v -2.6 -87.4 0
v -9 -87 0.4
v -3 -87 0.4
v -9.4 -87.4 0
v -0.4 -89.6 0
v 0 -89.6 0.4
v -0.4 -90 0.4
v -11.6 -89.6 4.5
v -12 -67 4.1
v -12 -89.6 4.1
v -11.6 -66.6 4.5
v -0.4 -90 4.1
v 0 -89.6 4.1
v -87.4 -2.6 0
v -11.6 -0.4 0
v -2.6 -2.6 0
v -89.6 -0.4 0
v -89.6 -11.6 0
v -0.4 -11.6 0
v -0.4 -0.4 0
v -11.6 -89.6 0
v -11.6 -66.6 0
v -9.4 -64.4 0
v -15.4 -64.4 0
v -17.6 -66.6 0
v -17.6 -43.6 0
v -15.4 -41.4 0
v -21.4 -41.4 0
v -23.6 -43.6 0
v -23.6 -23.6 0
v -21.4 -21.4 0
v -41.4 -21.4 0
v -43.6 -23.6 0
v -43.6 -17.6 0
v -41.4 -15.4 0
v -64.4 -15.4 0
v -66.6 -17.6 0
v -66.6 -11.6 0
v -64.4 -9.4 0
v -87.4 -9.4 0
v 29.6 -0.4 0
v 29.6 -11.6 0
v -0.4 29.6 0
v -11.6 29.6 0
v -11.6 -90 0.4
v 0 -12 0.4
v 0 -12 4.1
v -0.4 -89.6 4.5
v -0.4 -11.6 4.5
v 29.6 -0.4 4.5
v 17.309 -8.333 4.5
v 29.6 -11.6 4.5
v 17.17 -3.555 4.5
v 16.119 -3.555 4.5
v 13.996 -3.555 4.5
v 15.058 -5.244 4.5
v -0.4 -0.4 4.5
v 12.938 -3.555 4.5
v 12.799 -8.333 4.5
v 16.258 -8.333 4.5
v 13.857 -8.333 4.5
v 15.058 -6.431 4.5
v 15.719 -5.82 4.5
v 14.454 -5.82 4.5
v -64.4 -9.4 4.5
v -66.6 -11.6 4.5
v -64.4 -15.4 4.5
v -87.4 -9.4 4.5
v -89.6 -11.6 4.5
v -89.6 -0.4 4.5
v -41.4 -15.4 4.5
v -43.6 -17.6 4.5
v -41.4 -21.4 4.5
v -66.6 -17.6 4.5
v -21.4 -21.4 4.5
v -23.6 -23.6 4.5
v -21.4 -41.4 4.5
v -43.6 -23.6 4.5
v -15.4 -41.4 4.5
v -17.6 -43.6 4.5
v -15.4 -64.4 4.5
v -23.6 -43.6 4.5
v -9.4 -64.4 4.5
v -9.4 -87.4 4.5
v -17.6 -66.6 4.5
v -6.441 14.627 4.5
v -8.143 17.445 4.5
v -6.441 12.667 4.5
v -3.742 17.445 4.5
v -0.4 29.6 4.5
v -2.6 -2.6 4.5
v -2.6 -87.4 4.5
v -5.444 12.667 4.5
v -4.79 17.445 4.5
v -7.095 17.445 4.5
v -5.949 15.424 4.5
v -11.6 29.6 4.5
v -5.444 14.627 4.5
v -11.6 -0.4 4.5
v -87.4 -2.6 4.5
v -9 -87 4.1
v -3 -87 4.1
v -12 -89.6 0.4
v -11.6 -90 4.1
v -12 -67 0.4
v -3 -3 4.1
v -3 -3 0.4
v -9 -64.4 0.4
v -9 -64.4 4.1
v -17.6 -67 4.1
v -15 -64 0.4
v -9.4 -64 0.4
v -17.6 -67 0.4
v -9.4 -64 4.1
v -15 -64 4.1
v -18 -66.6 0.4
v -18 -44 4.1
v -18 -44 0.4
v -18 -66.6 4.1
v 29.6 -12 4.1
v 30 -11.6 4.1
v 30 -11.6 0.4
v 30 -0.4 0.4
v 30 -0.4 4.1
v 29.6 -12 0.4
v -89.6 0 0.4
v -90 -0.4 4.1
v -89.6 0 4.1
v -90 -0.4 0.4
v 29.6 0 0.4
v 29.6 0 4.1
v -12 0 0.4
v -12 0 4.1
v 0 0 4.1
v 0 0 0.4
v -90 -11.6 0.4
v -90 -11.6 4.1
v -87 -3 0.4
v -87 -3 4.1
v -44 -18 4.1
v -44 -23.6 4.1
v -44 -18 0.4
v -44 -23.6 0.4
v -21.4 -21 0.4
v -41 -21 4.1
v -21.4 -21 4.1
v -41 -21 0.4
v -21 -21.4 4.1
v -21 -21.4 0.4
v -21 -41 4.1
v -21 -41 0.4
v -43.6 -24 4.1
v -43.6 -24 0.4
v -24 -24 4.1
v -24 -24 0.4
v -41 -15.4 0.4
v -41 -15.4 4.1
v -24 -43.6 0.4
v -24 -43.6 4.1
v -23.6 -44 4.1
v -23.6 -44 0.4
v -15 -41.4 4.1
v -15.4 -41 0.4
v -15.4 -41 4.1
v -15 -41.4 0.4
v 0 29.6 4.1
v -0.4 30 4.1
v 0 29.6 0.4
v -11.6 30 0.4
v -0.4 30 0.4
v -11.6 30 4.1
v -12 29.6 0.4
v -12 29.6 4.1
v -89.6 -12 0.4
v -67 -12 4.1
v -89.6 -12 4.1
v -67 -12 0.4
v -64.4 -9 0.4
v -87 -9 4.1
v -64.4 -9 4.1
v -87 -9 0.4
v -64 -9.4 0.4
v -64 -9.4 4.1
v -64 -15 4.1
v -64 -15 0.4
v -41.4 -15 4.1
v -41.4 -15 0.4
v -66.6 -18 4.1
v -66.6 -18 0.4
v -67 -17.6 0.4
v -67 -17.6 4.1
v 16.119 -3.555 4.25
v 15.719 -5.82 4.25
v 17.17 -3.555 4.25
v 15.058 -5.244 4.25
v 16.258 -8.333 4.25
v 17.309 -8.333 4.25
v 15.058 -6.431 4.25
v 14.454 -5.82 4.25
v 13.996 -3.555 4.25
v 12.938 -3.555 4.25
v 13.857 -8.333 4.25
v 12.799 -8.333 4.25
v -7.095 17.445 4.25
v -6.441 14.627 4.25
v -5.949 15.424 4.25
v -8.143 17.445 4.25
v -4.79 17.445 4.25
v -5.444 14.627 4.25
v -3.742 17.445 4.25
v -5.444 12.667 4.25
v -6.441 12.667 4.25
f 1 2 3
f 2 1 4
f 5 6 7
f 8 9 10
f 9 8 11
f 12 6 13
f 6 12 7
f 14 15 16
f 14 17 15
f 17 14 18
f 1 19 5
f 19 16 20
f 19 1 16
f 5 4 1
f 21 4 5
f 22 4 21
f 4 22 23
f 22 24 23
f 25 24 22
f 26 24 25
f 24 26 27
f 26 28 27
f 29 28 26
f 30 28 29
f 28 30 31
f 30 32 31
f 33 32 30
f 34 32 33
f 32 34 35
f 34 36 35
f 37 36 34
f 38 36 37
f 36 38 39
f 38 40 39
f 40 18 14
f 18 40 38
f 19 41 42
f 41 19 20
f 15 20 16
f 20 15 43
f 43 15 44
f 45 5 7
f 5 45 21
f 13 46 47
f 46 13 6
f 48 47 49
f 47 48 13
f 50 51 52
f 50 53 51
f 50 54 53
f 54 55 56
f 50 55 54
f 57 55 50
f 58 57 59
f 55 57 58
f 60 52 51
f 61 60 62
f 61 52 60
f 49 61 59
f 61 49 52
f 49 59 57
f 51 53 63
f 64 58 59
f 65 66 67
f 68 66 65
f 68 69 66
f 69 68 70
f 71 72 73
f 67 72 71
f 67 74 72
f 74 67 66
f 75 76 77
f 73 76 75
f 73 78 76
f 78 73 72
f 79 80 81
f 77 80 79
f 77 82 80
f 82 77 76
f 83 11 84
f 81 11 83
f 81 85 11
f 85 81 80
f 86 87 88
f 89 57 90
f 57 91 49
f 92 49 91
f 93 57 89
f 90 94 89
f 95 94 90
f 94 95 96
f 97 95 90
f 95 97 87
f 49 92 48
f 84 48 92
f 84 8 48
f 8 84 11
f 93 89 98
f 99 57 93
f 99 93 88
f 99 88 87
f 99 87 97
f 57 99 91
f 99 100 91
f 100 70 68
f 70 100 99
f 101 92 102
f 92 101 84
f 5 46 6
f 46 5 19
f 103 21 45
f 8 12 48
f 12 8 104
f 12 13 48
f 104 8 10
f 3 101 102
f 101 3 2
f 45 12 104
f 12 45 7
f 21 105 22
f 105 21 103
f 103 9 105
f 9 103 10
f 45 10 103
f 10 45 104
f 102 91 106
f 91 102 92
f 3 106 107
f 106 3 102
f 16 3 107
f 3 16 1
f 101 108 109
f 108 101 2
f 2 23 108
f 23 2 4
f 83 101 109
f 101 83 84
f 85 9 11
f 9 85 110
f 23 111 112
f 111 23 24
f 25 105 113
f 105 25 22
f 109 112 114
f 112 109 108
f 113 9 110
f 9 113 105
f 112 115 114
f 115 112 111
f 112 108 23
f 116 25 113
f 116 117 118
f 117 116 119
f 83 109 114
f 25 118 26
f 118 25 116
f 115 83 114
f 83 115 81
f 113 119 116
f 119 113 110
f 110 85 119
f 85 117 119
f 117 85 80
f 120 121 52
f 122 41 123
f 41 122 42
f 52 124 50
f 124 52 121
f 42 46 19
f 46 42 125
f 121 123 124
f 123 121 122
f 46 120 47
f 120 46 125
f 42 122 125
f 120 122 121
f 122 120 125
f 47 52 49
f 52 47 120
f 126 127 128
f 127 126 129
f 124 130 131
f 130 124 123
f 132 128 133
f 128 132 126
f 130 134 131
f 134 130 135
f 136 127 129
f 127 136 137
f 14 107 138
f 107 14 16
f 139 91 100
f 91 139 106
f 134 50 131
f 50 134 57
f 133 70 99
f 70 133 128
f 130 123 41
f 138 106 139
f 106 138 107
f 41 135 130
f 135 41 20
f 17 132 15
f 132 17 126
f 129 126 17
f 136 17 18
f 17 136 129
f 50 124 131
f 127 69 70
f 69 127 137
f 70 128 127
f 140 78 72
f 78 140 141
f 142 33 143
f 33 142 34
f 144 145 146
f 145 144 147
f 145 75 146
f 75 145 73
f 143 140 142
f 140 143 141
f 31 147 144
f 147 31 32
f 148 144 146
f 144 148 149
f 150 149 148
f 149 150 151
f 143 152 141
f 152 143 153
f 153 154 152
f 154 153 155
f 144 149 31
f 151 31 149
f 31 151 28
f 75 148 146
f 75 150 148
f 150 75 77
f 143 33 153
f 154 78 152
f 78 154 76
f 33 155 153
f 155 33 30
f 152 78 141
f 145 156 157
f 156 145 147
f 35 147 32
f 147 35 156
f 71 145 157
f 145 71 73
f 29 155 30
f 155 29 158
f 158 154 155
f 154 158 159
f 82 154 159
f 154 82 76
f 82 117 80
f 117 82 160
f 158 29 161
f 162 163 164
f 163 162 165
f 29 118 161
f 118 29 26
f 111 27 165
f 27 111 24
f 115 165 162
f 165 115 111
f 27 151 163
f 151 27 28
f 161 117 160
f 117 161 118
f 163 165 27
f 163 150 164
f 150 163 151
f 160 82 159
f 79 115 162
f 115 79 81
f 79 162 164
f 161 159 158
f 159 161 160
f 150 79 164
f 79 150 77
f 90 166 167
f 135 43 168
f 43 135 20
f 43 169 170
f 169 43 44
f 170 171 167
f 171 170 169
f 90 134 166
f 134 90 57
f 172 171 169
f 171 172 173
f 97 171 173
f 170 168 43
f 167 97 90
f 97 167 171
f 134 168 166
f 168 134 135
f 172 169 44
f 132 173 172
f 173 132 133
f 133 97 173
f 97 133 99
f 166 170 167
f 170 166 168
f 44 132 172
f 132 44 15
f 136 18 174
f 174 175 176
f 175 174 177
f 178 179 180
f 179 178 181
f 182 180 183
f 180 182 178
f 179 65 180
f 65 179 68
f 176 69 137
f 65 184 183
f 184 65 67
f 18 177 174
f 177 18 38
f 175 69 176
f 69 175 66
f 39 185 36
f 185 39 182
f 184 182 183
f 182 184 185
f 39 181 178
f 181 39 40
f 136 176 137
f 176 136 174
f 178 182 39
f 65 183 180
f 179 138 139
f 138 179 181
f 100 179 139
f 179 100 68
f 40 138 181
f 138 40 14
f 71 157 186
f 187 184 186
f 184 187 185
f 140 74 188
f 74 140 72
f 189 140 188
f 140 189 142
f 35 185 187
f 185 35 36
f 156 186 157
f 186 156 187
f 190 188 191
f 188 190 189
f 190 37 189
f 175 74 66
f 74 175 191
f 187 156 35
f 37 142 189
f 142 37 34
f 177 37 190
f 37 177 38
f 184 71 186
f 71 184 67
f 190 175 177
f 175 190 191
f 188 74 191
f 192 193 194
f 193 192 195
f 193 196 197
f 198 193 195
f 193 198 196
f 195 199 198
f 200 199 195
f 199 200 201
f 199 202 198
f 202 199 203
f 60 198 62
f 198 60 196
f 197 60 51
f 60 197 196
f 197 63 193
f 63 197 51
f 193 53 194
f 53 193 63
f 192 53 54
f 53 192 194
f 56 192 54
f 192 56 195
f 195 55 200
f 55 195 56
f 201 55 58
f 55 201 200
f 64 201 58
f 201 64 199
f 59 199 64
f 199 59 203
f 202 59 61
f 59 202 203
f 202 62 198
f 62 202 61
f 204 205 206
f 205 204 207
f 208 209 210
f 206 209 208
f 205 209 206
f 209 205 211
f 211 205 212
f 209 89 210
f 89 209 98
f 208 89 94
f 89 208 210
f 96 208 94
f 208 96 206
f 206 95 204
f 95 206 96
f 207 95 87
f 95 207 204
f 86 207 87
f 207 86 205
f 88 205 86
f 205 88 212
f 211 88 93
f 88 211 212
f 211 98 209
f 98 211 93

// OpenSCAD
// SPDX-License-Identifier: AGPL-3.0-only
// Copyright (C) 2026 pOmelchenko
// Visual design prototype v1, not a released calibration artifact.
// Dimensions are in mm. Flat mid-height faces retain the nominal dimensions.
// Long arms point left and down, as in the reference sketch.

/* [Body] */
height = 4.5;
short_arm_length = 30;
// End positions of the three sections, measured from the crossing datum.
// Total X/Y extent = short_arm_length + the last end position.
section_ends = [44, 67, 90];
// Widths run from the crossing toward the long-arm tip.
// X-arm widths are measured along Y; Y-arm widths are measured along X.
x_arm_outer_widths = [24, 18, 12];
y_arm_outer_widths = [24, 18, 12];

/* [Through window] */
window_enabled = true;
x_arm_window_widths = [18, 12, 6];
y_arm_window_widths = [18, 12, 6];
// Distance from each straight outside edge to the straight window edge.
window_edge_offset = 3;
// Window shoulders precede outside shoulders by this distance.
// This also closes the far end of each window.
window_end_margin = 3;
minimum_web = 3;

/* [Finish] */
edge_chamfer = 0.4;
axis_labels = true;
label_depth = 0.25;
label_font = "Liberation Sans:style=Bold";

function previous_end(i) = i == 0 ? 0 : section_ends[i - 1];
function last(values) = values[len(values) - 1];

assert(height > 2 * edge_chamfer);
assert(edge_chamfer > 0);
assert(minimum_web > 2 * edge_chamfer);
assert(short_arm_length > 2 * edge_chamfer);
assert(len(section_ends) > 0);
assert(label_depth > 0 && label_depth < height - 2 * edge_chamfer);

module validate_arm(outer_widths, window_widths) {
    assert(len(outer_widths) == len(section_ends));
    assert(len(window_widths) == len(section_ends));
    for (i = [0 : len(section_ends) - 1]) {
        assert(section_ends[i] > previous_end(i));
        assert(outer_widths[i] > 2 * edge_chamfer);
        if (i > 0)
            assert(outer_widths[i] <= outer_widths[i - 1],
                   "Outer widths must not increase toward the tip");
        if (window_enabled) {
            assert(window_edge_offset >= minimum_web);
            assert(window_end_margin >= minimum_web);
            assert(window_widths[i] > 2 * edge_chamfer);
            assert(outer_widths[i] - window_edge_offset
                   - window_widths[i] >= minimum_web,
                   "Window leaves an undersized outside web");
            assert(section_ends[i] - previous_end(i)
                   > window_end_margin + window_edge_offset,
                   "Section is too short for the selected window margins");
            if (i > 0)
                assert(window_widths[i] <= window_widths[i - 1],
                       "Window widths must not increase toward the tip");
        }
    }
    children();
}

module arm_outline(widths) {
    union() {
        translate([-short_arm_length, 0])
            square([short_arm_length, last(widths)]);
        for (i = [0 : len(section_ends) - 1])
            translate([previous_end(i), 0])
                square([section_ends[i] - previous_end(i), widths[i]]);
    }
}

module arm_window(widths) {
    union() {
        for (i = [0 : len(section_ends) - 1]) {
            start = i == 0 ? window_edge_offset
                           : section_ends[i - 1] - window_end_margin;
            finish = section_ends[i] - window_end_margin;
            translate([start, window_edge_offset])
                square([finish - start, widths[i]]);
        }
    }
}

module transpose_xy() {
    mirror([1, -1, 0]) children();
}

module outline() {
    difference() {
        union() {
            arm_outline(x_arm_outer_widths);
            transpose_xy() arm_outline(y_arm_outer_widths);
        }
        if (window_enabled)
            union() {
                arm_window(x_arm_window_widths);
                transpose_xy() arm_window(y_arm_window_widths);
            }
    }
}

module octahedron(radius) {
    polyhedron(
        points = [[radius, 0, 0], [-radius, 0, 0],
                  [0, radius, 0], [0, -radius, 0],
                  [0, 0, radius], [0, 0, -radius]],
        faces = [[0, 2, 4], [2, 1, 4], [1, 3, 4], [3, 0, 4],
                 [2, 0, 5], [1, 2, 5], [3, 1, 5], [0, 3, 5]],
        convexity = 2
    );
}

module body() {
    // Chamfer top/bottom edges, including window rims. The measurement band
    // from z=edge_chamfer to z=height-edge_chamfer keeps the nominal outline.
    minkowski() {
        translate([0, 0, edge_chamfer])
            linear_extrude(height = height - 2 * edge_chamfer)
                offset(delta = -edge_chamfer) outline();
        octahedron(edge_chamfer);
    }
}

module engraving(value, position) {
    translate([position[0], position[1], height - label_depth])
        linear_extrude(height = label_depth + 0.05)
            rotate(180)
                text(value, size = 5, font = label_font,
                     halign = "center", valign = "center");
}

validate_arm(x_arm_outer_widths, x_arm_window_widths)
validate_arm(y_arm_outer_widths, y_arm_window_widths)
rotate(180)
    difference() {
        body();
        if (axis_labels) {
            engraving("X", [-short_arm_length / 2,
                            last(x_arm_outer_widths) / 2]);
            engraving("Y", [last(y_arm_outer_widths) / 2,
                            -short_arm_length / 2]);
        }
    }
